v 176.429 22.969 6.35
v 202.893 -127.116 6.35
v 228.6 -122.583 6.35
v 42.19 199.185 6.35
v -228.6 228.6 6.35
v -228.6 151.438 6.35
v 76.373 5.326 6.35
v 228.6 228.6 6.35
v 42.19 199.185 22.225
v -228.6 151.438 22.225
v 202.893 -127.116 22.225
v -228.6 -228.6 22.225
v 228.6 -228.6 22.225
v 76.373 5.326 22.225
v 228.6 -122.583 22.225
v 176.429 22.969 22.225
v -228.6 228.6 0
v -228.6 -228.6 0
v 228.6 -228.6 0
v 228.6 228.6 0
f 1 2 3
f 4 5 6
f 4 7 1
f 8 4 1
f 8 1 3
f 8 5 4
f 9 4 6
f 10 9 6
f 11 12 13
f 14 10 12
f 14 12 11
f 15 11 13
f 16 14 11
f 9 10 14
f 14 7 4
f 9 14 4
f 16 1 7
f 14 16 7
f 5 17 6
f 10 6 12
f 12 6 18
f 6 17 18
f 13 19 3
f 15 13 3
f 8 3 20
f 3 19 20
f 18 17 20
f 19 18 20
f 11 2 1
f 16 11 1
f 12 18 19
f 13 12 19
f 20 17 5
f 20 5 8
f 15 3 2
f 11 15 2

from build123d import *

# Parameters (mm, degrees)
F0_W     = 457.2
F0_H     = 457.2
F1_DEPTH = 6.35
F3_DEPTH = 15.875
F5_DEPTH = 15.875
F7_DEPTH = 15.875


with BuildPart() as f1:
    # F0 (on Top) → F1 (new body)
    with BuildSketch(Plane.XY):
        Rectangle(F0_W, F0_H)
    extrude(amount=F1_DEPTH)

    # F2 (on face) → F3 (join)
    with BuildSketch(Plane.XY.offset(6.35)):
        Polygon((76.373018, 5.326067), (102.837036, -144.758628), (202.893499, -127.11595), (176.429482, 22.968745), align=None)
    extrude(amount=F3_DEPTH)

    # F4 (on face) → F5 (join)
    with BuildSketch(Plane.XY.offset(6.35)):
        Polygon((228.6, -122.583194), (202.893499, -127.11595), (102.837036, -144.758628), (-228.6, -203.2), (-228.6, -228.6), (228.6, -228.6), align=None)
    extrude(amount=F5_DEPTH)

    # F6 (on face) → F7 (join)
    with BuildSketch(Plane.XY.offset(6.35)):
        Polygon((-228.6, -203.2), (102.837036, -144.758628), (76.373018, 5.326067), (42.190329, 199.185465), (-228.6, 151.437759), align=None)
    extrude(amount=F7_DEPTH)


solid = f1.part
